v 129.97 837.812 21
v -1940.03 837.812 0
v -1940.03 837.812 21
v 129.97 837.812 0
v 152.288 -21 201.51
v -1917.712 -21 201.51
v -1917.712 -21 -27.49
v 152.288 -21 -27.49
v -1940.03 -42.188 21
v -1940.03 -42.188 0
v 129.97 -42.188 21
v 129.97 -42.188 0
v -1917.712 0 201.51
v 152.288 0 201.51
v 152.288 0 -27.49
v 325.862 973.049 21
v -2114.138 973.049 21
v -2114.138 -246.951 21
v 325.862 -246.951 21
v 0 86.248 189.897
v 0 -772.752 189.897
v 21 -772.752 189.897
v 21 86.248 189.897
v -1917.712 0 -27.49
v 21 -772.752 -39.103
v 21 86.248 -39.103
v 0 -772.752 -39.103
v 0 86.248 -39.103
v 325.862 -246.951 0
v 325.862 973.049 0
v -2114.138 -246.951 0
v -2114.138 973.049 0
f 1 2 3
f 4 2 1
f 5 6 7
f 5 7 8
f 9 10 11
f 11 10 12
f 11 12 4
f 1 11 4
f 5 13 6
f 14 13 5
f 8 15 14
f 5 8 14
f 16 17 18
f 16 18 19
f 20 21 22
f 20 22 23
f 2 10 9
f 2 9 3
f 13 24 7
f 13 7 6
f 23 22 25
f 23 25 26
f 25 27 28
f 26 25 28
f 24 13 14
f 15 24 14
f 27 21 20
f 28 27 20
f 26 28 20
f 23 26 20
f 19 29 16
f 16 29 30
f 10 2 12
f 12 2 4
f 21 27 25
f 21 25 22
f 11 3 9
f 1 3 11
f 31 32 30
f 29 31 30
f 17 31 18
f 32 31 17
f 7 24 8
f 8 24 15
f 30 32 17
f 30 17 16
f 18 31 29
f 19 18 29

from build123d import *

# Parameters (mm, degrees)
F0_W     = 2070
F0_H     = 880
F1_DEPTH = 21
F2_W     = 2070
F2_H     = 229
F3_DEPTH = 21
F4_W     = 859
F4_H     = 229
F5_DEPTH = 21
F6_W     = 2440
F6_H     = 1220
F7_DEPTH = 21


with BuildPart() as f1:
    # F0 (on Top) → F1 (new body)
    with BuildSketch(Plane.XY):
        with Locations((-905.03024, 397.812499)):
            Rectangle(F0_W, F0_H)
    extrude(amount=F1_DEPTH)


with BuildPart() as f3:
    # F2 (on Front) → F3 (new body)
    with BuildSketch(Plane.XZ):
        with Locations((-882.71169, 87.010081)):
            Rectangle(F2_W, F2_H)
    extrude(amount=F3_DEPTH)


with BuildPart() as f5:
    # F4 (on Right) → F5 (new body)
    with BuildSketch(Plane.YZ):
        with Locations((-343.252011, 75.397177)):
            Rectangle(F4_W, F4_H)
    extrude(amount=F5_DEPTH)


with BuildPart() as f7:
    # F6 (on Top) → F7 (new body)
    with BuildSketch(Plane.XY):
        with Locations((-894.138278, 363.048703)):
            Rectangle(F6_W, F6_H)
    extrude(amount=F7_DEPTH)


solid = Compound([f1.part, f3.part, f5.part, f7.part])
